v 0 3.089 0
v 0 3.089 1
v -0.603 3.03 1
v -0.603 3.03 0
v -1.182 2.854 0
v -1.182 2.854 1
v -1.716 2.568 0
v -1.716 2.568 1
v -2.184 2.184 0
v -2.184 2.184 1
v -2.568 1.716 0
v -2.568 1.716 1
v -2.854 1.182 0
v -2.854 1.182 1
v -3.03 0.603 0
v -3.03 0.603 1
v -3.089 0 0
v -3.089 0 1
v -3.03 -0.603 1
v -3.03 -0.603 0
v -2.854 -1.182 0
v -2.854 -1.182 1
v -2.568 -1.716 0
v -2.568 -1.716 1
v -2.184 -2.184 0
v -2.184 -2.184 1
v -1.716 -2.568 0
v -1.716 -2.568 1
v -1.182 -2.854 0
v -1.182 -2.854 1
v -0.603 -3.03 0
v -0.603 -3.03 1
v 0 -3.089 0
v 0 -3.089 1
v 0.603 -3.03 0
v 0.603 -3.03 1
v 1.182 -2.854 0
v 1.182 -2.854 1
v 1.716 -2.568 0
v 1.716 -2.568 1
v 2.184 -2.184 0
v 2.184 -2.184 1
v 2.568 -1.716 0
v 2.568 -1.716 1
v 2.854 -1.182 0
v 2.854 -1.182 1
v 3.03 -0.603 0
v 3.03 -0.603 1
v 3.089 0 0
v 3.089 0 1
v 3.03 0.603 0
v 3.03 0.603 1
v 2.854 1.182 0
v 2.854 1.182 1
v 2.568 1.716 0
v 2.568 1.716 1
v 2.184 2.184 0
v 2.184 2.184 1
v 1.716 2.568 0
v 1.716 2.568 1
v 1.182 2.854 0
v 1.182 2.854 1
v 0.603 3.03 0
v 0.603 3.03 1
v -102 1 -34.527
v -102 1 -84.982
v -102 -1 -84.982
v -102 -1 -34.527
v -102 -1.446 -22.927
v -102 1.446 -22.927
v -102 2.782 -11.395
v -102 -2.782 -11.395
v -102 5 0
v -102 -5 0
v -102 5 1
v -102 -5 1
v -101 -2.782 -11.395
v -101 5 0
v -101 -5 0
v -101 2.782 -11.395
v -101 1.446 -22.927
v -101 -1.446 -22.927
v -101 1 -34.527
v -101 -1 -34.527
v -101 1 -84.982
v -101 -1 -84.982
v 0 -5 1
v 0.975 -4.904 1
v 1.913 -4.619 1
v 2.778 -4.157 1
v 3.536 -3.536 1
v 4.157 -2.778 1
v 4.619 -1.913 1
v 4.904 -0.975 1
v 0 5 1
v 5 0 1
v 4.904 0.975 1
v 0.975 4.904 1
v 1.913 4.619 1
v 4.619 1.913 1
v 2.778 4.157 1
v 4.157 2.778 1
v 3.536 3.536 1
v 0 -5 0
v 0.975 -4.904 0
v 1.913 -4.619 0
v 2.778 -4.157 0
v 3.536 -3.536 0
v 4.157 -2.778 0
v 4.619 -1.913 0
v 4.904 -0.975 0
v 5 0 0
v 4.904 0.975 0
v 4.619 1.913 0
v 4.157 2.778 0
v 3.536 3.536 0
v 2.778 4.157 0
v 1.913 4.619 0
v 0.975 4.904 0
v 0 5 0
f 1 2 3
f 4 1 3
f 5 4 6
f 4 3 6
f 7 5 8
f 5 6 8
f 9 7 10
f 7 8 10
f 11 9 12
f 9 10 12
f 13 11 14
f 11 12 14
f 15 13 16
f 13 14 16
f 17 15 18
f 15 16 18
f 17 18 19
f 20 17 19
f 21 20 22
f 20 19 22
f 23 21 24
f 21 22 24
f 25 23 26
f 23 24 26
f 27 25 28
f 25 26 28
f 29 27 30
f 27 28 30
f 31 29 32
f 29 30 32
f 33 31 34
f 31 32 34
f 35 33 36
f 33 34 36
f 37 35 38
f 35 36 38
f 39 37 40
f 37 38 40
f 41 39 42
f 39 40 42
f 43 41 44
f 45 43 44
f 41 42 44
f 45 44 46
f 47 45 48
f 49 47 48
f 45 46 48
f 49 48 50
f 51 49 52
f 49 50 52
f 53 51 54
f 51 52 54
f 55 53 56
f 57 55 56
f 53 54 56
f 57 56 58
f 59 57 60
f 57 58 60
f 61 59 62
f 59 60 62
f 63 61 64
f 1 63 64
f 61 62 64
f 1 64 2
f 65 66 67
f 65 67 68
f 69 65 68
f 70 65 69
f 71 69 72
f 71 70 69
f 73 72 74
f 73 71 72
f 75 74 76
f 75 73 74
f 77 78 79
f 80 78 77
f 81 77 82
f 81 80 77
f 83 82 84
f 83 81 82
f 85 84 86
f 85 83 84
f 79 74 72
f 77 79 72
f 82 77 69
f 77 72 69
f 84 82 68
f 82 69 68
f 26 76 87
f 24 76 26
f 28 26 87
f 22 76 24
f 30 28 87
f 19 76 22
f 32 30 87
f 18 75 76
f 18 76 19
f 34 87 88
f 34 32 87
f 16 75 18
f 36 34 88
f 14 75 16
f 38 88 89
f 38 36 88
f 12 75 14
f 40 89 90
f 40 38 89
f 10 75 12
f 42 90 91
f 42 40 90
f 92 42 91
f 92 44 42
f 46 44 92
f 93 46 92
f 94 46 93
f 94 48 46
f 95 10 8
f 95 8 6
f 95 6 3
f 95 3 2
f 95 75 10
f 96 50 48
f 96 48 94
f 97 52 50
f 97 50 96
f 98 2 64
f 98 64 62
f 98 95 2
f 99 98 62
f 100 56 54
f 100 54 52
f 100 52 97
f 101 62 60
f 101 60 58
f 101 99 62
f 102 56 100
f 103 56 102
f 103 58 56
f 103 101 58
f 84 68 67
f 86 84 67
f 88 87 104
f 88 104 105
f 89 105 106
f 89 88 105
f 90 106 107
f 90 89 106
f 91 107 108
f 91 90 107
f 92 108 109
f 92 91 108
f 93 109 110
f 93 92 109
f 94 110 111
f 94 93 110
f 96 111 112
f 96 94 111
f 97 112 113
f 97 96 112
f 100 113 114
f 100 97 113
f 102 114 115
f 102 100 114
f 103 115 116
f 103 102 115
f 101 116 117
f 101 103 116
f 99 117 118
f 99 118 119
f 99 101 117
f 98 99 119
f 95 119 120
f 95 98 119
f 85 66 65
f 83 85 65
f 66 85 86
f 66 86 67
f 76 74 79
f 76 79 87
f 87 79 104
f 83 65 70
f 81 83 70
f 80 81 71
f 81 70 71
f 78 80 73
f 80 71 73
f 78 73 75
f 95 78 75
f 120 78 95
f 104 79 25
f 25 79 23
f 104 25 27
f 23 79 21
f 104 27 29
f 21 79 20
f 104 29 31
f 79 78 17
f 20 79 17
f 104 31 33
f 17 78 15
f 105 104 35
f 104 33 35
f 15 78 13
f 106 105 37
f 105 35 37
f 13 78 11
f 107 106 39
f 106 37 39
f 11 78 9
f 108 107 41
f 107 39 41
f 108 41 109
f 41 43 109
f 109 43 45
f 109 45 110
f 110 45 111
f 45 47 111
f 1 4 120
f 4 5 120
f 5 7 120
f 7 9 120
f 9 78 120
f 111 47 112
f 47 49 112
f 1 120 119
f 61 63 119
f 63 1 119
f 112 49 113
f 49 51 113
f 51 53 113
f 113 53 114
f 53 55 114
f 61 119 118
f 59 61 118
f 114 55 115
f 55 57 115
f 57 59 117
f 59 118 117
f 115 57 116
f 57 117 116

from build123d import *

# Parameters (mm, degrees)
BOSS_EXTRUDE1_DEPTH     = 5
SKETCH2_R               = 5
SKETCH2_R_2             = 3.088913235
BOSS_EXTRUDE2_DEPTH     = 1
SKETCH3_R               = 3.088913235
CUT_EXTRUDE1_DEPTH      = 1
CUT_EXTRUDE2_DEPTH      = 1
CUT_EXTRUDE2_DEPTH_BACK = 10


with BuildPart() as part:
    # Sketch1 → Boss-Extrude1 (new body, symmetric)
    with BuildSketch(Plane(origin=(0, 0, 0), x_dir=(1, 0, 0), z_dir=(0, 1, 0))):
        Polygon((0, 0), (-101, 0), (-101, 84.981911775), (-102, 84.981911775), (-102, -1), (0, -1), align=None)
    extrude(amount=BOSS_EXTRUDE1_DEPTH, both=True)

    # Sketch2 → Boss-Extrude2 (add)
    with BuildSketch(Plane.XY.offset(1)):
        Circle(SKETCH2_R)
        Circle(SKETCH2_R_2, mode=Mode.SUBTRACT)
    extrude(amount=-BOSS_EXTRUDE2_DEPTH)

    # Sketch3 → Cut-Extrude1 (cut)
    with BuildSketch(Plane.XY.offset(1)):
        Circle(SKETCH3_R)
    extrude(amount=-CUT_EXTRUDE1_DEPTH, mode=Mode.SUBTRACT)

    # Sketch4 → Cut-Extrude2 (cut, two sides)
    with BuildSketch(Plane.ZY.offset(102)) as cut_extrude2_sk:
        with BuildLine():
            Line((-84.981911775, 5), (-84.981911775, 1))
            Line((-84.981911775, 1), (-34.527427825, 1))
            ThreePointArc((-34.527427825, 1), (-17.14825011, 2.003332972), (0, 5))
            Line((0, 5), (-84.981911775, 5))
        make_face()
        with BuildLine():
            Line((-34.527427825, -1), (-84.981911775, -1))
            Line((-84.981911775, -1), (-84.981911775, -5))
            Line((-84.981911775, -5), (0, -5))
            ThreePointArc((0, -5), (-17.14825011, -2.003332972), (-34.527427825, -1))
        make_face()
    extrude(amount=CUT_EXTRUDE2_DEPTH, mode=Mode.SUBTRACT)
    extrude(cut_extrude2_sk.sketch, amount=-CUT_EXTRUDE2_DEPTH_BACK, mode=Mode.SUBTRACT)


solid = part.part
